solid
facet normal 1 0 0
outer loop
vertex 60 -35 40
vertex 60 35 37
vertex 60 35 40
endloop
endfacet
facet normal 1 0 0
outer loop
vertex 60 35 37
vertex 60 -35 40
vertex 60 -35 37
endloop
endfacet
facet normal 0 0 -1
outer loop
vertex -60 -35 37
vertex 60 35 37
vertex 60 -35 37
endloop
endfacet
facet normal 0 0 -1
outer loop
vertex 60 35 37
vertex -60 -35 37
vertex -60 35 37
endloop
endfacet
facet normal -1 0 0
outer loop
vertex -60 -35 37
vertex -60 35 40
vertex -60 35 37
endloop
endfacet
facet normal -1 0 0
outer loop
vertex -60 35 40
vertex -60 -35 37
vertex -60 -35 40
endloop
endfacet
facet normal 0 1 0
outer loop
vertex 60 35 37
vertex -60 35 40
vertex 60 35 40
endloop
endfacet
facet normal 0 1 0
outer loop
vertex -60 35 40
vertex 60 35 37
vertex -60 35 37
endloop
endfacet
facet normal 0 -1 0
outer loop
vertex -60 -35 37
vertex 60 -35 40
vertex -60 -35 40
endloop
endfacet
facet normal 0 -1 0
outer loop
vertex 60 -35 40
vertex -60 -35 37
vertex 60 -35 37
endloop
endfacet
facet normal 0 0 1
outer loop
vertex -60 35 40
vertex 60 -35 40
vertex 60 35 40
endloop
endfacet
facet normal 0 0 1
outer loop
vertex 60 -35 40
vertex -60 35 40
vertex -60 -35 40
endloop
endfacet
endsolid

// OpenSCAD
// Built by bench/smallmodels/features/compiler.py from a list of features.
$fn = 64;
difference() {
  union() {
    translate([0, 0, 0]) translate([-60, -35, 0]) cube([120, 70, 40]);
  }
  union() {
    translate([0, 0, 0]) rotate([0, 0, 0]) translate([-60, -35, 0]) cube([120, 70, 37]);
    translate([-2, -18, 13]) rotate([0, 0, 0]) translate([-57, -32, 0]) cube([114, 64, 10]);
  }
}
